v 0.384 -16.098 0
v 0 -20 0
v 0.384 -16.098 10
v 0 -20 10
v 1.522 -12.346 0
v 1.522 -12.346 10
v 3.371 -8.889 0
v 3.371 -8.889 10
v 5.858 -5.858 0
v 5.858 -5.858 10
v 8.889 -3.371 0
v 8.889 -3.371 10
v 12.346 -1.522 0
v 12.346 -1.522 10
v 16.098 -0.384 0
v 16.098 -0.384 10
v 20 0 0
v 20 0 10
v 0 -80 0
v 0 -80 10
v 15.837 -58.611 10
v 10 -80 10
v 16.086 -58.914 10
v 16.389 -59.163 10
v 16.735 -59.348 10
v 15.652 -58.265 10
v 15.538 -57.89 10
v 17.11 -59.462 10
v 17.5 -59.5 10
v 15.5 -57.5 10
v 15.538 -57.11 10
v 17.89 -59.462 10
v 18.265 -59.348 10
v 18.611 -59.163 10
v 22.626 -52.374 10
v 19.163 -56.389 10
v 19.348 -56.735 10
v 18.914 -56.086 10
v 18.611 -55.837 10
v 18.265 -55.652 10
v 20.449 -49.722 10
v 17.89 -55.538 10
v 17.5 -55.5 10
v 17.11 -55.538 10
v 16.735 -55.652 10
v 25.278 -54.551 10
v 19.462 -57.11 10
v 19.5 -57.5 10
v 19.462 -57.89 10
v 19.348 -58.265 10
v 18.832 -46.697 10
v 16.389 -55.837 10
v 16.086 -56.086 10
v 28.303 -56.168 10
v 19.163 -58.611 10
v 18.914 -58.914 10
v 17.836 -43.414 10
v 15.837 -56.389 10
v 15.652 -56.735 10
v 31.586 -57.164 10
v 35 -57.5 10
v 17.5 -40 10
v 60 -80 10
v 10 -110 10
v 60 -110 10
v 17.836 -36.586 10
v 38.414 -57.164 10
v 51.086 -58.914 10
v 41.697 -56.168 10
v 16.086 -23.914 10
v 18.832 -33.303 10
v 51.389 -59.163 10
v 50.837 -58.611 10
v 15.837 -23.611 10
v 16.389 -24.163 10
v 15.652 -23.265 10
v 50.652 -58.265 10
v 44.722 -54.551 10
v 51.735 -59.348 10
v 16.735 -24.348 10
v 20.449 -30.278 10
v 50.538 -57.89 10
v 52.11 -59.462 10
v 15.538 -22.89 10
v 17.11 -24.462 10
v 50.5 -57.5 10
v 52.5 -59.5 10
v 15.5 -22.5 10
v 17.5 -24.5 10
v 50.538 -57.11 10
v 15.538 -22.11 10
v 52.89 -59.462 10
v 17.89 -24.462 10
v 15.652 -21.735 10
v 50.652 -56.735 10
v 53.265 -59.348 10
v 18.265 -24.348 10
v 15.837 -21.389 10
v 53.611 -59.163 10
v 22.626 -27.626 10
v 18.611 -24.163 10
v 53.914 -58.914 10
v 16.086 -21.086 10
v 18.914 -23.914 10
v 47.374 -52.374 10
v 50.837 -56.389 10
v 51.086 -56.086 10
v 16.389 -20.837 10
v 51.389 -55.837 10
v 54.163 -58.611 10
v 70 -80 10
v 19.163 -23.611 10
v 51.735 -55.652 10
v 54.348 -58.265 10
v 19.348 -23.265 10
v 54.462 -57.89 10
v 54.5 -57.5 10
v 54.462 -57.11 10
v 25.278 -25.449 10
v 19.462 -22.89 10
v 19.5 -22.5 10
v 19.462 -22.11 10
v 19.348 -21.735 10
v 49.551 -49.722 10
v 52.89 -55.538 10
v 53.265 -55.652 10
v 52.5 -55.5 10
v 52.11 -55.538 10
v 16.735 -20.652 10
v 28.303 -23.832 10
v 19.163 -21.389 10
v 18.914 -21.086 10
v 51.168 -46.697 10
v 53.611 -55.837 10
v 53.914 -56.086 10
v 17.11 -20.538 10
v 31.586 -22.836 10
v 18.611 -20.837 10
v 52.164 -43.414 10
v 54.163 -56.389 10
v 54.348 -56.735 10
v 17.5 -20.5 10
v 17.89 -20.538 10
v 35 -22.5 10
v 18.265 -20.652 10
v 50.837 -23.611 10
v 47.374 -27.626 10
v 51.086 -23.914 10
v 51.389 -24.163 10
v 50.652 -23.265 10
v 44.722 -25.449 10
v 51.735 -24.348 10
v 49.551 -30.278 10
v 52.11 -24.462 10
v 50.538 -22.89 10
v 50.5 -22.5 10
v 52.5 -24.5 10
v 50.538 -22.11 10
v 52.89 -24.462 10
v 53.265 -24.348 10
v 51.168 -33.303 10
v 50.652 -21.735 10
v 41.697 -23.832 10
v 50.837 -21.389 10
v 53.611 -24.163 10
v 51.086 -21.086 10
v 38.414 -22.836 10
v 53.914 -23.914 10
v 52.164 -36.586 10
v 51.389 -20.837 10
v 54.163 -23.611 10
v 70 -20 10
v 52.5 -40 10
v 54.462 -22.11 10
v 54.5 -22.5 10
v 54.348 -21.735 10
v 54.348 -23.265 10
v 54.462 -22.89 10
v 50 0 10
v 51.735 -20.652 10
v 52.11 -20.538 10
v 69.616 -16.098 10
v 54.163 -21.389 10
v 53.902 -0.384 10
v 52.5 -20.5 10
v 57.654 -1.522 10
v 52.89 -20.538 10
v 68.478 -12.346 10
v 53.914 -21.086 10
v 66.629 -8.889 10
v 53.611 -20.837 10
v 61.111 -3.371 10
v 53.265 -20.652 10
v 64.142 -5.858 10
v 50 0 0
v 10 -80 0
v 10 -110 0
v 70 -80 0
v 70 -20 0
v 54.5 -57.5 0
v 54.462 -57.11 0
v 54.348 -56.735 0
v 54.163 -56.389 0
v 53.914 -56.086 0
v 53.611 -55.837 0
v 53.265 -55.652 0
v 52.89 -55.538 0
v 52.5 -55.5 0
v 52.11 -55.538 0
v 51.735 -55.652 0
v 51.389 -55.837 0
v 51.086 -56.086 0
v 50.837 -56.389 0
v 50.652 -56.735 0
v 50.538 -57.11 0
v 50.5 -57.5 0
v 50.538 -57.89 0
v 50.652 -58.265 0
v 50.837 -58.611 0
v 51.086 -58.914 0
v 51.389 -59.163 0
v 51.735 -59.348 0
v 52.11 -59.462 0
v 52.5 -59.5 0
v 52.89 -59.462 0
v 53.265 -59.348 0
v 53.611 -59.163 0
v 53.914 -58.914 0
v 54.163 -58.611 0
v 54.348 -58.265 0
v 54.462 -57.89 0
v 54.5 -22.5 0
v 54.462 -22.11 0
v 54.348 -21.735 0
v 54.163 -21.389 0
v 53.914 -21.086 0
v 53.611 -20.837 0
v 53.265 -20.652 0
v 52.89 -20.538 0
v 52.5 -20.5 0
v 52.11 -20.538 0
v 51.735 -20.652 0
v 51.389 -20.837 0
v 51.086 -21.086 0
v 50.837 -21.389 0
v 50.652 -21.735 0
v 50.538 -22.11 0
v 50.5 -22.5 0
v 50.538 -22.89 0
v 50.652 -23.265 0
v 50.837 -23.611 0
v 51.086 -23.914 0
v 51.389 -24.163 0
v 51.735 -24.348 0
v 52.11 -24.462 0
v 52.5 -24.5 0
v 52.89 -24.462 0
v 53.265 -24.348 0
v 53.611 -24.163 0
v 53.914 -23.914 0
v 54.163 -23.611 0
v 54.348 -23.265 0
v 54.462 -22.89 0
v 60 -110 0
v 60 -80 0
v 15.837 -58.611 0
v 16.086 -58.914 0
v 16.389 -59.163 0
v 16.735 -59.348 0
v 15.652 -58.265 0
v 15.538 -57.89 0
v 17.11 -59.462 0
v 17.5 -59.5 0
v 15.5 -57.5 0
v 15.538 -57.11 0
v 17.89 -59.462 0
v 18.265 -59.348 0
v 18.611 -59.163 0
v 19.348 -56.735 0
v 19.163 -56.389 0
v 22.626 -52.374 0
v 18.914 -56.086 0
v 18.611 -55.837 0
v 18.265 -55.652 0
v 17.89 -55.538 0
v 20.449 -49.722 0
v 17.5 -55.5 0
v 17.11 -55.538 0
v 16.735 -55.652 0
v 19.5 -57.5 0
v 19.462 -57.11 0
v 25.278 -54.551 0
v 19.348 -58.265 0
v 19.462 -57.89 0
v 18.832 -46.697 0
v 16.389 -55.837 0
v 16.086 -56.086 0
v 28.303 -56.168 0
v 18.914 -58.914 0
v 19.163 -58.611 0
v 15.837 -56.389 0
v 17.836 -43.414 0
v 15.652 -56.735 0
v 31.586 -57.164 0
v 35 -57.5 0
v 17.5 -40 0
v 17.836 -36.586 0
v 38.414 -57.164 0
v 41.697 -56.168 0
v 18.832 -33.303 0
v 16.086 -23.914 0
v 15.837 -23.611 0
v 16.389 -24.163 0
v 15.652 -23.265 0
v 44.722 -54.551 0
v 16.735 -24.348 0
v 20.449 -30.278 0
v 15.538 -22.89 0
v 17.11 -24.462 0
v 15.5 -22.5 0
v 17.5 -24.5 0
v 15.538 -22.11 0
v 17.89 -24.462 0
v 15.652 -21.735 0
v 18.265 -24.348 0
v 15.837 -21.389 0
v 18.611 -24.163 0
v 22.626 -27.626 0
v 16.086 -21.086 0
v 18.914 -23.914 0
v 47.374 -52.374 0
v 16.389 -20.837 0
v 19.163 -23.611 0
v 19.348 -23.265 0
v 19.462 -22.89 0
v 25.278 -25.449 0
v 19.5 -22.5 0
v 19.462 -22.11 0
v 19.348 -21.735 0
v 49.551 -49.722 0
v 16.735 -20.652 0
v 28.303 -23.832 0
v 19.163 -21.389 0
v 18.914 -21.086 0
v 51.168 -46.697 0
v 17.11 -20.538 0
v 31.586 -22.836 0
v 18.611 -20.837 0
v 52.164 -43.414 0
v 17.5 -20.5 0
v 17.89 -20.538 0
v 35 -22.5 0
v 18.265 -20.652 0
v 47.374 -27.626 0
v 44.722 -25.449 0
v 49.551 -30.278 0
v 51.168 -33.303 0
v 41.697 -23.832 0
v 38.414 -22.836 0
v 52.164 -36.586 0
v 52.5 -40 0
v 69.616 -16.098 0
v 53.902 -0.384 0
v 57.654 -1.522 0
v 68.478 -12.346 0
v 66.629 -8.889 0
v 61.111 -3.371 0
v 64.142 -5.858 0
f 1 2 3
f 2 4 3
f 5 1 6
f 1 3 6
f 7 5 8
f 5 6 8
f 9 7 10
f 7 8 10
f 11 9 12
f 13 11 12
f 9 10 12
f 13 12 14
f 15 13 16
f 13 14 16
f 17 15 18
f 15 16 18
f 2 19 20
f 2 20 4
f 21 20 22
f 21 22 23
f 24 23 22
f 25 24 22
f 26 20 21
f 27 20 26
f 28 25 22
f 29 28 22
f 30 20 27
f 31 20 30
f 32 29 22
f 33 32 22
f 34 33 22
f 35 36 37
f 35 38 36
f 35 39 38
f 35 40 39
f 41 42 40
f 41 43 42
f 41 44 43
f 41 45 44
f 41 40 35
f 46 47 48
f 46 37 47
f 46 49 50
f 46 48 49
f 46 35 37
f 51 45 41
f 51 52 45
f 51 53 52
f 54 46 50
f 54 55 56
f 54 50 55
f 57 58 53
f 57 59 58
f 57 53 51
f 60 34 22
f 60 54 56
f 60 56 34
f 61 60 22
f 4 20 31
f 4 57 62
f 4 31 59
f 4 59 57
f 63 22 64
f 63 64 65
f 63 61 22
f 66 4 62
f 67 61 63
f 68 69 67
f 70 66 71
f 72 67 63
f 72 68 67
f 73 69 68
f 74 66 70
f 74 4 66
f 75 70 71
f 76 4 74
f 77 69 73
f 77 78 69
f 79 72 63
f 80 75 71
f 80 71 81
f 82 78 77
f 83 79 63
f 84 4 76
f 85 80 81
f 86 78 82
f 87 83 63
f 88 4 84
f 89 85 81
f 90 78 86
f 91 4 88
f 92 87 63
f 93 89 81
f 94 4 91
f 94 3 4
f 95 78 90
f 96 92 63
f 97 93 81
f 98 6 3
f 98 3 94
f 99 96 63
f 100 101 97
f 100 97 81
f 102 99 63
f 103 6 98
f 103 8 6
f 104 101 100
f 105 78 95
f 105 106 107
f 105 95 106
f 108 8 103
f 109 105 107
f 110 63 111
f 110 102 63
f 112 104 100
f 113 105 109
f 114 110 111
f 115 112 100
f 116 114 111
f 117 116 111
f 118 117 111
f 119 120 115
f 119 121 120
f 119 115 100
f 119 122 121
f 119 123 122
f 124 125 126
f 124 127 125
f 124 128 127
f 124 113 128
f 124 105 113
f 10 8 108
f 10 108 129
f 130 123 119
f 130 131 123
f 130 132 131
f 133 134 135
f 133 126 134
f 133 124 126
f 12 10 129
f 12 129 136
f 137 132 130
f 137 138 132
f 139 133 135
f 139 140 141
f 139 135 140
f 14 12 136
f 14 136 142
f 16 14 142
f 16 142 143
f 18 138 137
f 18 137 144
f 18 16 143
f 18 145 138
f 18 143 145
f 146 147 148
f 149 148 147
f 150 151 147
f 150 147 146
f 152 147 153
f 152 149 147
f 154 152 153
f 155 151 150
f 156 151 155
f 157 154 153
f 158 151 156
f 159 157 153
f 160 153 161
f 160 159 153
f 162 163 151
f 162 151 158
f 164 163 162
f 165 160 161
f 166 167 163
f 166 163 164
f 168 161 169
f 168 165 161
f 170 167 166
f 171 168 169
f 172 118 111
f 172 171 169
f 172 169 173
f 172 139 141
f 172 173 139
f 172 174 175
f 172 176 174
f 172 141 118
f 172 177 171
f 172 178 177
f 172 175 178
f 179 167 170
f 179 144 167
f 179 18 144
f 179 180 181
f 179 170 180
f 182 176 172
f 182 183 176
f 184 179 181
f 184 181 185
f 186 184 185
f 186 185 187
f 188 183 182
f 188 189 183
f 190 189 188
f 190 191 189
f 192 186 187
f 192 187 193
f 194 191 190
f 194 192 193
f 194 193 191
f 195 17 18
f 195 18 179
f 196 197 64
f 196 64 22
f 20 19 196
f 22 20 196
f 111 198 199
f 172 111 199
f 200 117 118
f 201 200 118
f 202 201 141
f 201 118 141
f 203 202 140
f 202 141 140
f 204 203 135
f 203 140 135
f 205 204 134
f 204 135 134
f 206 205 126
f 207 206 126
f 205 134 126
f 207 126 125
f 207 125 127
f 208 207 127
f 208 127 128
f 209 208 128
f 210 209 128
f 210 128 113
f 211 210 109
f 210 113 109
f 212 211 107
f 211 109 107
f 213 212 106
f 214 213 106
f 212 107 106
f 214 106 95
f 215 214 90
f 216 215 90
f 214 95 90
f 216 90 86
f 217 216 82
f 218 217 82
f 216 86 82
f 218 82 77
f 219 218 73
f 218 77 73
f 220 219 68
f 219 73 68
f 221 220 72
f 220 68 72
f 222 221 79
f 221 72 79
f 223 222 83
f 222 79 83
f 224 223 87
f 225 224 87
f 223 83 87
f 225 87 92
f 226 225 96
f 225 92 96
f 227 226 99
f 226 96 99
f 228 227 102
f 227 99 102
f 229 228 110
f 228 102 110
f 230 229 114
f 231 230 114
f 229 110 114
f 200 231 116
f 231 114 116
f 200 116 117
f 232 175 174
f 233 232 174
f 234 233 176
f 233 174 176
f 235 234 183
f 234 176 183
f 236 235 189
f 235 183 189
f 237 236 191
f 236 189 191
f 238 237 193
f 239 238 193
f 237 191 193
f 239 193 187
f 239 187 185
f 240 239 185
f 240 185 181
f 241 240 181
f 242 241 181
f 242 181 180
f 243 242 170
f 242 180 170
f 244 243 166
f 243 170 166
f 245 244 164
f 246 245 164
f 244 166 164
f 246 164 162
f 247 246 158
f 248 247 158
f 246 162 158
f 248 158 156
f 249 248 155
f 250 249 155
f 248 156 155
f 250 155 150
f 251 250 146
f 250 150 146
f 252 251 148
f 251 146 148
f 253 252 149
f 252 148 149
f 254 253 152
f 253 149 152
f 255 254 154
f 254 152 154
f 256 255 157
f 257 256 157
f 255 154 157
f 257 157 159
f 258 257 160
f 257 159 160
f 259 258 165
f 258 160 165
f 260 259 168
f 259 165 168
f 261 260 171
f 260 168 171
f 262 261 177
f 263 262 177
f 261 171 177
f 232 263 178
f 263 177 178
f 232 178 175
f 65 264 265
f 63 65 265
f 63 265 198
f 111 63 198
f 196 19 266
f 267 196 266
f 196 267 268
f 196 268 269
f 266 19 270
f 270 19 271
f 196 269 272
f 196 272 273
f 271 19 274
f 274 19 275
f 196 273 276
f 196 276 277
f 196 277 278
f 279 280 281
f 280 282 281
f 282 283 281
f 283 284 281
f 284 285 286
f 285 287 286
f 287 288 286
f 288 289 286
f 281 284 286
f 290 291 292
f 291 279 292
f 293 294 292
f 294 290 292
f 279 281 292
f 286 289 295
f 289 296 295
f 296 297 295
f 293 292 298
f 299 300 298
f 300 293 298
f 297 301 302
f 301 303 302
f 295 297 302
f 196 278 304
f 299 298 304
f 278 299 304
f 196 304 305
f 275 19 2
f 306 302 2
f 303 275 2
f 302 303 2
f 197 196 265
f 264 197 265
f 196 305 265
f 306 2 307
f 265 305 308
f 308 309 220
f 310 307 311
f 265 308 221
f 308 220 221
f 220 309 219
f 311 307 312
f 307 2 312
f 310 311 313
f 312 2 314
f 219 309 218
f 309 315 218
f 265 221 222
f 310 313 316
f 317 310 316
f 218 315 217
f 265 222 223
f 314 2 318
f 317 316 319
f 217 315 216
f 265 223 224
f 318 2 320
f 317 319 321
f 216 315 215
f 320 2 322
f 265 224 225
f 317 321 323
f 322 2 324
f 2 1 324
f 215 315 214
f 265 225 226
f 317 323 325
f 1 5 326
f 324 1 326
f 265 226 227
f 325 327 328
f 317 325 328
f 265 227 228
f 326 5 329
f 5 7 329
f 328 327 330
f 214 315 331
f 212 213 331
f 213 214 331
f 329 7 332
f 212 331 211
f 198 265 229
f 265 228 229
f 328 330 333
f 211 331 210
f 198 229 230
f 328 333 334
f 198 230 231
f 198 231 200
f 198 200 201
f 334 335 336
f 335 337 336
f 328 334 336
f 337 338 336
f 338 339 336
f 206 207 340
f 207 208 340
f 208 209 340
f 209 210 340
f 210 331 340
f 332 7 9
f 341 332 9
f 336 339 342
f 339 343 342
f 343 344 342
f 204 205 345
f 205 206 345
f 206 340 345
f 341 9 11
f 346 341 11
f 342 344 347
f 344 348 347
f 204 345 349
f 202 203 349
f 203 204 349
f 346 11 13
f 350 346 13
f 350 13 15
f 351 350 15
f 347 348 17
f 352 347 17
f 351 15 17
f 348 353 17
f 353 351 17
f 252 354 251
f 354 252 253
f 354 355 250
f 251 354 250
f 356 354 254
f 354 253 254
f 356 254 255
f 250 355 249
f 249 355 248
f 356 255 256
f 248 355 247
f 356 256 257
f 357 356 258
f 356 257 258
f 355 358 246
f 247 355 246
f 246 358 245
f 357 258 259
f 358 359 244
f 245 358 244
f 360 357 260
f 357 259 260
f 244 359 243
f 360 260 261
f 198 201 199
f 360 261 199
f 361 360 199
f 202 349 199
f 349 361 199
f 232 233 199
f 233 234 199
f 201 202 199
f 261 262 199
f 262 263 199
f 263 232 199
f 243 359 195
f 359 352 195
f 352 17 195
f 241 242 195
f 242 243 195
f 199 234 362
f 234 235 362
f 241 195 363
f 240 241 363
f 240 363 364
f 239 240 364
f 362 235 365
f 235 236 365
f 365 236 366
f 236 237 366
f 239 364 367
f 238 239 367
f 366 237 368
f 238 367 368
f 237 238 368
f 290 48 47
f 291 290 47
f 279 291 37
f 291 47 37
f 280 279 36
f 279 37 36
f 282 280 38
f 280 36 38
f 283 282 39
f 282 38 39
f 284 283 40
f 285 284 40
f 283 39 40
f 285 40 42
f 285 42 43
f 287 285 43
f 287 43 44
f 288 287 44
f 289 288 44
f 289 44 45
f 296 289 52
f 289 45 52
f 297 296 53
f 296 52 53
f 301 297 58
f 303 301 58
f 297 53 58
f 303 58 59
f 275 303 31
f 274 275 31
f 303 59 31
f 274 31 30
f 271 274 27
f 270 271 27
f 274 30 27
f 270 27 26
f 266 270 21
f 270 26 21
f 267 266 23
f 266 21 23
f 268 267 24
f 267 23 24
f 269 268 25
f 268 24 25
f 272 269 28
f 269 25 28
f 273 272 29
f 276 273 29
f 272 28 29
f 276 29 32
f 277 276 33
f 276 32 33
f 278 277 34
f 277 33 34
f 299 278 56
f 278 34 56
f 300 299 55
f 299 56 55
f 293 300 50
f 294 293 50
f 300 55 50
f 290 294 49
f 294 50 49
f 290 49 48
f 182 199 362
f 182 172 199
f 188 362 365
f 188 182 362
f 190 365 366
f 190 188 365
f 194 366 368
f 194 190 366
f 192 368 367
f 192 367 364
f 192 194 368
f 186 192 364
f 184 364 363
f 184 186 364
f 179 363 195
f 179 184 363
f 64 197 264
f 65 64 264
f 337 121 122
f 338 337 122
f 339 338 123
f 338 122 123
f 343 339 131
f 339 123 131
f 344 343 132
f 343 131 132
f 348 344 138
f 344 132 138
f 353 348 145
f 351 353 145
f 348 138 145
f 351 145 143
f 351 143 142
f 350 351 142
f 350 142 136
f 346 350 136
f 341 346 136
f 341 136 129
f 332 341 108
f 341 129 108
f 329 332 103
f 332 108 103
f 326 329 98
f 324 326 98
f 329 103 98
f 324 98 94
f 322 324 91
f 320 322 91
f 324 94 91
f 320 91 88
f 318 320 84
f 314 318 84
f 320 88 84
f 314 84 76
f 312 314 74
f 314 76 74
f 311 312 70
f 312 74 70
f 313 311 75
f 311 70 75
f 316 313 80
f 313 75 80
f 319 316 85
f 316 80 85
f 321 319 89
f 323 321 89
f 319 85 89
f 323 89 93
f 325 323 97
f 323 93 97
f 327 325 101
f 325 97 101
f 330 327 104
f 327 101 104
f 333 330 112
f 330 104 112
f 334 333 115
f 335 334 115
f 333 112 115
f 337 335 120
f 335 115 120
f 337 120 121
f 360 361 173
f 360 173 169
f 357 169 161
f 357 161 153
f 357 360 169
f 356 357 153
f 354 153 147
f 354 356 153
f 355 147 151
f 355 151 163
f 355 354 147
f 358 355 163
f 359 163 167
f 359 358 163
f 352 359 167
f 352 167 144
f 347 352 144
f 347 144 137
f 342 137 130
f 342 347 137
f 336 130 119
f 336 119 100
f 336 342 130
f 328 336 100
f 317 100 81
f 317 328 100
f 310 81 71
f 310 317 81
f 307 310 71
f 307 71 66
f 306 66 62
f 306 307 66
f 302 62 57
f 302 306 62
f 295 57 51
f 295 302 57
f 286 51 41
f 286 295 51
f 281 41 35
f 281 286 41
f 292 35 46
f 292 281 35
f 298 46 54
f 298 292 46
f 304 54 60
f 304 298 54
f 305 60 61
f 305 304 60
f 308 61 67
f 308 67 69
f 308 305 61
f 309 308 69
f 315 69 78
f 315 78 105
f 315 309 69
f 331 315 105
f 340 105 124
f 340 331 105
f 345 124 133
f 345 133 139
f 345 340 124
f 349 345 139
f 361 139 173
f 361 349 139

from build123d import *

# Parameters (mm, degrees)
SKETCH1_W           = 70
SKETCH1_H           = 80
SKETCH1_R           = 17.5
SKETCH1_W_2         = 50
SKETCH1_H_2         = 30
BOSS_EXTRUDE1_DEPTH = 10
FILLET1_R           = 20
SKETCH2_R           = 2
CUT_EXTRUDE1_DEPTH  = 10


with BuildPart() as part:
    # Sketch1 → Boss-Extrude1 (new body)
    with BuildSketch(Plane.XY):
        with Locations((35, -40)):
            Rectangle(SKETCH1_W, SKETCH1_H)
        with Locations((35, -40)):
            Circle(SKETCH1_R, mode=Mode.SUBTRACT)
        with Locations((35, -95)):
            Rectangle(SKETCH1_W_2, SKETCH1_H_2)
    extrude(amount=BOSS_EXTRUDE1_DEPTH)

    # Fillet1
    fillet1_edges = [part.edges().sort_by_distance(p)[0] for p in [
        (70, 0, 5),
        (0, 0, 5),
    ]]
    fillet(fillet1_edges, radius=FILLET1_R)

    # Sketch2 → Cut-Extrude1 (cut)
    with BuildSketch(Plane.XY.offset(10)):
        with Locations((17.5, -22.5)):
            Circle(SKETCH2_R)
        with Locations((52.5, -22.5)):
            Circle(SKETCH2_R)
        with Locations((52.5, -57.5)):
            Circle(SKETCH2_R)
        with Locations((17.5, -57.5)):
            Circle(SKETCH2_R)
    extrude(amount=-CUT_EXTRUDE1_DEPTH, mode=Mode.SUBTRACT)


solid = part.part
